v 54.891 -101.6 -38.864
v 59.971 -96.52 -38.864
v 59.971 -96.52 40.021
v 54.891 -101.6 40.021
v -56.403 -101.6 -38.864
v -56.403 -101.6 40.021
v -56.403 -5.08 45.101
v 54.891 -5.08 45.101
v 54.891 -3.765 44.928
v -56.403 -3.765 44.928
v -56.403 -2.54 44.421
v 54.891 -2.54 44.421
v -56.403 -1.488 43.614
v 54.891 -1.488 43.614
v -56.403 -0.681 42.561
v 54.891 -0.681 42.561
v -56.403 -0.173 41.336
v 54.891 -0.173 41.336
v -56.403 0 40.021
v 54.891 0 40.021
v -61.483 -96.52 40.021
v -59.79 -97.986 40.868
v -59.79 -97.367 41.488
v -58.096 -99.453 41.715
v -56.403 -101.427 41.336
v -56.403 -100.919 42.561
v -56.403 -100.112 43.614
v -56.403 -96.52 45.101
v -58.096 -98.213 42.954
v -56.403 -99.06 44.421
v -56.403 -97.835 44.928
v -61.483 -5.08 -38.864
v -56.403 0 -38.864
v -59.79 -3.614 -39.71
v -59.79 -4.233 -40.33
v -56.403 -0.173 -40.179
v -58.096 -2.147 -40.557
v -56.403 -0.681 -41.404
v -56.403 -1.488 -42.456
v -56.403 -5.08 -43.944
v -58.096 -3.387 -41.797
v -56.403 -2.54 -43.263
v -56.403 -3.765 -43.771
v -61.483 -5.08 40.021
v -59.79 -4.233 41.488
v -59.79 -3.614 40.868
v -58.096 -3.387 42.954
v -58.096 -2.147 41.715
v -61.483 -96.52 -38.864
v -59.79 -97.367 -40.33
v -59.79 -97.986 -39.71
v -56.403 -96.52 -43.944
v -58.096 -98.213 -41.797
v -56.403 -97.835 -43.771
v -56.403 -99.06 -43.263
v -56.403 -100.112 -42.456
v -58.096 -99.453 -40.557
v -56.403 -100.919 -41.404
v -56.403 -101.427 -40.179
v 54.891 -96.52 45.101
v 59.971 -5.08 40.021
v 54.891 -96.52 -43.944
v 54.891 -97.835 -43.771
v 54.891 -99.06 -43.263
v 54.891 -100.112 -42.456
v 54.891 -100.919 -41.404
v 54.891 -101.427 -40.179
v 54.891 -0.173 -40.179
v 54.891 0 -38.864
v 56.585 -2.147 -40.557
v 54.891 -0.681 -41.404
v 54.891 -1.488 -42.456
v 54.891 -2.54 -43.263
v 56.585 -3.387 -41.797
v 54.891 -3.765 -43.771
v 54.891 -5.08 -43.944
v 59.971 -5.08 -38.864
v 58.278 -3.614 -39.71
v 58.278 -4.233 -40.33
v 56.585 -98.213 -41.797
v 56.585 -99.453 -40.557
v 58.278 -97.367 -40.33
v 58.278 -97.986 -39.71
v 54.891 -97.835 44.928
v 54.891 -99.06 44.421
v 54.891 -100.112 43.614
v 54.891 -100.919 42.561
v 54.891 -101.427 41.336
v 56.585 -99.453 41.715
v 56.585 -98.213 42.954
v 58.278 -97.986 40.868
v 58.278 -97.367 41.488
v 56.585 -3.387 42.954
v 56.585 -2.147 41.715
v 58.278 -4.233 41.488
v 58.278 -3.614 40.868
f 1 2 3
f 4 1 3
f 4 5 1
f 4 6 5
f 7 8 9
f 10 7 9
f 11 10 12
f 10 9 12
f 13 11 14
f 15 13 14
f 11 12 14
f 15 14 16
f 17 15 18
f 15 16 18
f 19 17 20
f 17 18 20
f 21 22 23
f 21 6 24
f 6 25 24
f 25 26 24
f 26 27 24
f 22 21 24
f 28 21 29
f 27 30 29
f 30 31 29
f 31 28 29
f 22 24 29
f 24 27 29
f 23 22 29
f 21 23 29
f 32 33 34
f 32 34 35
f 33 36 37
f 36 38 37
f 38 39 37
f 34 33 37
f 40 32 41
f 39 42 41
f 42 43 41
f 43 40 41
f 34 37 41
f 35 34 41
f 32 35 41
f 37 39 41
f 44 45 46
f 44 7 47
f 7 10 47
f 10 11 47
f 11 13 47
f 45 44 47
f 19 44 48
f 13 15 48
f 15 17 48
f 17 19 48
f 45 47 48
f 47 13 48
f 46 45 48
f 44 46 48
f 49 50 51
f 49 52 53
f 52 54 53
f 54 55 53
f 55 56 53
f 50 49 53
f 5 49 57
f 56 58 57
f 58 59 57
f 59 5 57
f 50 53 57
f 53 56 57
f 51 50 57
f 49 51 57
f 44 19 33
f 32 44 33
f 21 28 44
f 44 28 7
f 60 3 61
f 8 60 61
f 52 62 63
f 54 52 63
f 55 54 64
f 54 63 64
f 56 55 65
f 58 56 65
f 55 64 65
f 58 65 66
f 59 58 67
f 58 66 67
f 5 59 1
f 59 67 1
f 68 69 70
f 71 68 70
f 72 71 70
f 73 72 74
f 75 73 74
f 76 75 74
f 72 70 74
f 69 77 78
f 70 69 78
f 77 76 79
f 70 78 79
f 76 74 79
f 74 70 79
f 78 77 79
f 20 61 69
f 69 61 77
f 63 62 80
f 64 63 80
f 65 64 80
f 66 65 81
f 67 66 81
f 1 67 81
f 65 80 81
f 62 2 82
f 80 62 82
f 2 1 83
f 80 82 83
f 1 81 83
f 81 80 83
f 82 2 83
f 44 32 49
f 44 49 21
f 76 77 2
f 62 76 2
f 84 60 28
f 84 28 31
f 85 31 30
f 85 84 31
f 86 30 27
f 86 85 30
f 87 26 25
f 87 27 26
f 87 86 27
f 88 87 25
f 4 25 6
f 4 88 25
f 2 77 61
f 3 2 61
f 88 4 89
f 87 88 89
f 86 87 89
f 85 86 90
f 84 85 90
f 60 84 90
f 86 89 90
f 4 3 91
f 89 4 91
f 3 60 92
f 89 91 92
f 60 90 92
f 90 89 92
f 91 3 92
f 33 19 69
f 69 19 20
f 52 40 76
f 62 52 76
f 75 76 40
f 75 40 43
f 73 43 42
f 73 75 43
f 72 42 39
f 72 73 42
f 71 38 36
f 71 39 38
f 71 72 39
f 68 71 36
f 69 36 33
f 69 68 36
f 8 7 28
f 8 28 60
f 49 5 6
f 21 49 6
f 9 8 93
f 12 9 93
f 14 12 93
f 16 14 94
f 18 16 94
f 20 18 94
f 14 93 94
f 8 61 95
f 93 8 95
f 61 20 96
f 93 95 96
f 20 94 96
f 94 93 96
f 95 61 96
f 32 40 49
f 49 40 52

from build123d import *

# Parameters (mm, degrees)
F0_W     = 121.4544754475
F0_H     = 89.0452750027
F1_DEPTH = 101.6
F2_R     = 5.08
F3_SIZE  = 5.07999


# Not quite as in the source:
# - a fillet or chamfer is up to 0.001 mm smaller than in the source, because OpenCascade refuses the exact size


with BuildPart() as f1:
    # F0 (on Front) → F1 (new body)
    with BuildSketch(Plane.XZ):
        with Locations((-0.7558902726, 0.5788286217)):
            Rectangle(F0_W, F0_H)
    extrude(amount=F1_DEPTH)

    # F2
    f2_edges = [f1.edges().sort_by_distance(p)[0] for p in [
        (-0.75589, 0, 45.101466),
        (-0.75589, -101.6, 45.101466),
        (-0.75589, 0, -43.943809),
        (-0.75589, -101.6, -43.943809),
    ]]
    fillet(f2_edges, radius=F2_R)

    # F3 (size 5.08 in the source; OpenCascade refuses exactly that, so slightly less here)
    f3_edges = [f1.edges().sort_by_distance(p)[0] for p in [
        (59.971347, -50.8, -43.943809),
        (-61.483128, -50.8, -43.943809),
        (59.971347, -50.8, 45.101466),
        (-61.483128, -50.8, 45.101466),
    ]]
    chamfer(f3_edges, length=F3_SIZE)


solid = f1.part
